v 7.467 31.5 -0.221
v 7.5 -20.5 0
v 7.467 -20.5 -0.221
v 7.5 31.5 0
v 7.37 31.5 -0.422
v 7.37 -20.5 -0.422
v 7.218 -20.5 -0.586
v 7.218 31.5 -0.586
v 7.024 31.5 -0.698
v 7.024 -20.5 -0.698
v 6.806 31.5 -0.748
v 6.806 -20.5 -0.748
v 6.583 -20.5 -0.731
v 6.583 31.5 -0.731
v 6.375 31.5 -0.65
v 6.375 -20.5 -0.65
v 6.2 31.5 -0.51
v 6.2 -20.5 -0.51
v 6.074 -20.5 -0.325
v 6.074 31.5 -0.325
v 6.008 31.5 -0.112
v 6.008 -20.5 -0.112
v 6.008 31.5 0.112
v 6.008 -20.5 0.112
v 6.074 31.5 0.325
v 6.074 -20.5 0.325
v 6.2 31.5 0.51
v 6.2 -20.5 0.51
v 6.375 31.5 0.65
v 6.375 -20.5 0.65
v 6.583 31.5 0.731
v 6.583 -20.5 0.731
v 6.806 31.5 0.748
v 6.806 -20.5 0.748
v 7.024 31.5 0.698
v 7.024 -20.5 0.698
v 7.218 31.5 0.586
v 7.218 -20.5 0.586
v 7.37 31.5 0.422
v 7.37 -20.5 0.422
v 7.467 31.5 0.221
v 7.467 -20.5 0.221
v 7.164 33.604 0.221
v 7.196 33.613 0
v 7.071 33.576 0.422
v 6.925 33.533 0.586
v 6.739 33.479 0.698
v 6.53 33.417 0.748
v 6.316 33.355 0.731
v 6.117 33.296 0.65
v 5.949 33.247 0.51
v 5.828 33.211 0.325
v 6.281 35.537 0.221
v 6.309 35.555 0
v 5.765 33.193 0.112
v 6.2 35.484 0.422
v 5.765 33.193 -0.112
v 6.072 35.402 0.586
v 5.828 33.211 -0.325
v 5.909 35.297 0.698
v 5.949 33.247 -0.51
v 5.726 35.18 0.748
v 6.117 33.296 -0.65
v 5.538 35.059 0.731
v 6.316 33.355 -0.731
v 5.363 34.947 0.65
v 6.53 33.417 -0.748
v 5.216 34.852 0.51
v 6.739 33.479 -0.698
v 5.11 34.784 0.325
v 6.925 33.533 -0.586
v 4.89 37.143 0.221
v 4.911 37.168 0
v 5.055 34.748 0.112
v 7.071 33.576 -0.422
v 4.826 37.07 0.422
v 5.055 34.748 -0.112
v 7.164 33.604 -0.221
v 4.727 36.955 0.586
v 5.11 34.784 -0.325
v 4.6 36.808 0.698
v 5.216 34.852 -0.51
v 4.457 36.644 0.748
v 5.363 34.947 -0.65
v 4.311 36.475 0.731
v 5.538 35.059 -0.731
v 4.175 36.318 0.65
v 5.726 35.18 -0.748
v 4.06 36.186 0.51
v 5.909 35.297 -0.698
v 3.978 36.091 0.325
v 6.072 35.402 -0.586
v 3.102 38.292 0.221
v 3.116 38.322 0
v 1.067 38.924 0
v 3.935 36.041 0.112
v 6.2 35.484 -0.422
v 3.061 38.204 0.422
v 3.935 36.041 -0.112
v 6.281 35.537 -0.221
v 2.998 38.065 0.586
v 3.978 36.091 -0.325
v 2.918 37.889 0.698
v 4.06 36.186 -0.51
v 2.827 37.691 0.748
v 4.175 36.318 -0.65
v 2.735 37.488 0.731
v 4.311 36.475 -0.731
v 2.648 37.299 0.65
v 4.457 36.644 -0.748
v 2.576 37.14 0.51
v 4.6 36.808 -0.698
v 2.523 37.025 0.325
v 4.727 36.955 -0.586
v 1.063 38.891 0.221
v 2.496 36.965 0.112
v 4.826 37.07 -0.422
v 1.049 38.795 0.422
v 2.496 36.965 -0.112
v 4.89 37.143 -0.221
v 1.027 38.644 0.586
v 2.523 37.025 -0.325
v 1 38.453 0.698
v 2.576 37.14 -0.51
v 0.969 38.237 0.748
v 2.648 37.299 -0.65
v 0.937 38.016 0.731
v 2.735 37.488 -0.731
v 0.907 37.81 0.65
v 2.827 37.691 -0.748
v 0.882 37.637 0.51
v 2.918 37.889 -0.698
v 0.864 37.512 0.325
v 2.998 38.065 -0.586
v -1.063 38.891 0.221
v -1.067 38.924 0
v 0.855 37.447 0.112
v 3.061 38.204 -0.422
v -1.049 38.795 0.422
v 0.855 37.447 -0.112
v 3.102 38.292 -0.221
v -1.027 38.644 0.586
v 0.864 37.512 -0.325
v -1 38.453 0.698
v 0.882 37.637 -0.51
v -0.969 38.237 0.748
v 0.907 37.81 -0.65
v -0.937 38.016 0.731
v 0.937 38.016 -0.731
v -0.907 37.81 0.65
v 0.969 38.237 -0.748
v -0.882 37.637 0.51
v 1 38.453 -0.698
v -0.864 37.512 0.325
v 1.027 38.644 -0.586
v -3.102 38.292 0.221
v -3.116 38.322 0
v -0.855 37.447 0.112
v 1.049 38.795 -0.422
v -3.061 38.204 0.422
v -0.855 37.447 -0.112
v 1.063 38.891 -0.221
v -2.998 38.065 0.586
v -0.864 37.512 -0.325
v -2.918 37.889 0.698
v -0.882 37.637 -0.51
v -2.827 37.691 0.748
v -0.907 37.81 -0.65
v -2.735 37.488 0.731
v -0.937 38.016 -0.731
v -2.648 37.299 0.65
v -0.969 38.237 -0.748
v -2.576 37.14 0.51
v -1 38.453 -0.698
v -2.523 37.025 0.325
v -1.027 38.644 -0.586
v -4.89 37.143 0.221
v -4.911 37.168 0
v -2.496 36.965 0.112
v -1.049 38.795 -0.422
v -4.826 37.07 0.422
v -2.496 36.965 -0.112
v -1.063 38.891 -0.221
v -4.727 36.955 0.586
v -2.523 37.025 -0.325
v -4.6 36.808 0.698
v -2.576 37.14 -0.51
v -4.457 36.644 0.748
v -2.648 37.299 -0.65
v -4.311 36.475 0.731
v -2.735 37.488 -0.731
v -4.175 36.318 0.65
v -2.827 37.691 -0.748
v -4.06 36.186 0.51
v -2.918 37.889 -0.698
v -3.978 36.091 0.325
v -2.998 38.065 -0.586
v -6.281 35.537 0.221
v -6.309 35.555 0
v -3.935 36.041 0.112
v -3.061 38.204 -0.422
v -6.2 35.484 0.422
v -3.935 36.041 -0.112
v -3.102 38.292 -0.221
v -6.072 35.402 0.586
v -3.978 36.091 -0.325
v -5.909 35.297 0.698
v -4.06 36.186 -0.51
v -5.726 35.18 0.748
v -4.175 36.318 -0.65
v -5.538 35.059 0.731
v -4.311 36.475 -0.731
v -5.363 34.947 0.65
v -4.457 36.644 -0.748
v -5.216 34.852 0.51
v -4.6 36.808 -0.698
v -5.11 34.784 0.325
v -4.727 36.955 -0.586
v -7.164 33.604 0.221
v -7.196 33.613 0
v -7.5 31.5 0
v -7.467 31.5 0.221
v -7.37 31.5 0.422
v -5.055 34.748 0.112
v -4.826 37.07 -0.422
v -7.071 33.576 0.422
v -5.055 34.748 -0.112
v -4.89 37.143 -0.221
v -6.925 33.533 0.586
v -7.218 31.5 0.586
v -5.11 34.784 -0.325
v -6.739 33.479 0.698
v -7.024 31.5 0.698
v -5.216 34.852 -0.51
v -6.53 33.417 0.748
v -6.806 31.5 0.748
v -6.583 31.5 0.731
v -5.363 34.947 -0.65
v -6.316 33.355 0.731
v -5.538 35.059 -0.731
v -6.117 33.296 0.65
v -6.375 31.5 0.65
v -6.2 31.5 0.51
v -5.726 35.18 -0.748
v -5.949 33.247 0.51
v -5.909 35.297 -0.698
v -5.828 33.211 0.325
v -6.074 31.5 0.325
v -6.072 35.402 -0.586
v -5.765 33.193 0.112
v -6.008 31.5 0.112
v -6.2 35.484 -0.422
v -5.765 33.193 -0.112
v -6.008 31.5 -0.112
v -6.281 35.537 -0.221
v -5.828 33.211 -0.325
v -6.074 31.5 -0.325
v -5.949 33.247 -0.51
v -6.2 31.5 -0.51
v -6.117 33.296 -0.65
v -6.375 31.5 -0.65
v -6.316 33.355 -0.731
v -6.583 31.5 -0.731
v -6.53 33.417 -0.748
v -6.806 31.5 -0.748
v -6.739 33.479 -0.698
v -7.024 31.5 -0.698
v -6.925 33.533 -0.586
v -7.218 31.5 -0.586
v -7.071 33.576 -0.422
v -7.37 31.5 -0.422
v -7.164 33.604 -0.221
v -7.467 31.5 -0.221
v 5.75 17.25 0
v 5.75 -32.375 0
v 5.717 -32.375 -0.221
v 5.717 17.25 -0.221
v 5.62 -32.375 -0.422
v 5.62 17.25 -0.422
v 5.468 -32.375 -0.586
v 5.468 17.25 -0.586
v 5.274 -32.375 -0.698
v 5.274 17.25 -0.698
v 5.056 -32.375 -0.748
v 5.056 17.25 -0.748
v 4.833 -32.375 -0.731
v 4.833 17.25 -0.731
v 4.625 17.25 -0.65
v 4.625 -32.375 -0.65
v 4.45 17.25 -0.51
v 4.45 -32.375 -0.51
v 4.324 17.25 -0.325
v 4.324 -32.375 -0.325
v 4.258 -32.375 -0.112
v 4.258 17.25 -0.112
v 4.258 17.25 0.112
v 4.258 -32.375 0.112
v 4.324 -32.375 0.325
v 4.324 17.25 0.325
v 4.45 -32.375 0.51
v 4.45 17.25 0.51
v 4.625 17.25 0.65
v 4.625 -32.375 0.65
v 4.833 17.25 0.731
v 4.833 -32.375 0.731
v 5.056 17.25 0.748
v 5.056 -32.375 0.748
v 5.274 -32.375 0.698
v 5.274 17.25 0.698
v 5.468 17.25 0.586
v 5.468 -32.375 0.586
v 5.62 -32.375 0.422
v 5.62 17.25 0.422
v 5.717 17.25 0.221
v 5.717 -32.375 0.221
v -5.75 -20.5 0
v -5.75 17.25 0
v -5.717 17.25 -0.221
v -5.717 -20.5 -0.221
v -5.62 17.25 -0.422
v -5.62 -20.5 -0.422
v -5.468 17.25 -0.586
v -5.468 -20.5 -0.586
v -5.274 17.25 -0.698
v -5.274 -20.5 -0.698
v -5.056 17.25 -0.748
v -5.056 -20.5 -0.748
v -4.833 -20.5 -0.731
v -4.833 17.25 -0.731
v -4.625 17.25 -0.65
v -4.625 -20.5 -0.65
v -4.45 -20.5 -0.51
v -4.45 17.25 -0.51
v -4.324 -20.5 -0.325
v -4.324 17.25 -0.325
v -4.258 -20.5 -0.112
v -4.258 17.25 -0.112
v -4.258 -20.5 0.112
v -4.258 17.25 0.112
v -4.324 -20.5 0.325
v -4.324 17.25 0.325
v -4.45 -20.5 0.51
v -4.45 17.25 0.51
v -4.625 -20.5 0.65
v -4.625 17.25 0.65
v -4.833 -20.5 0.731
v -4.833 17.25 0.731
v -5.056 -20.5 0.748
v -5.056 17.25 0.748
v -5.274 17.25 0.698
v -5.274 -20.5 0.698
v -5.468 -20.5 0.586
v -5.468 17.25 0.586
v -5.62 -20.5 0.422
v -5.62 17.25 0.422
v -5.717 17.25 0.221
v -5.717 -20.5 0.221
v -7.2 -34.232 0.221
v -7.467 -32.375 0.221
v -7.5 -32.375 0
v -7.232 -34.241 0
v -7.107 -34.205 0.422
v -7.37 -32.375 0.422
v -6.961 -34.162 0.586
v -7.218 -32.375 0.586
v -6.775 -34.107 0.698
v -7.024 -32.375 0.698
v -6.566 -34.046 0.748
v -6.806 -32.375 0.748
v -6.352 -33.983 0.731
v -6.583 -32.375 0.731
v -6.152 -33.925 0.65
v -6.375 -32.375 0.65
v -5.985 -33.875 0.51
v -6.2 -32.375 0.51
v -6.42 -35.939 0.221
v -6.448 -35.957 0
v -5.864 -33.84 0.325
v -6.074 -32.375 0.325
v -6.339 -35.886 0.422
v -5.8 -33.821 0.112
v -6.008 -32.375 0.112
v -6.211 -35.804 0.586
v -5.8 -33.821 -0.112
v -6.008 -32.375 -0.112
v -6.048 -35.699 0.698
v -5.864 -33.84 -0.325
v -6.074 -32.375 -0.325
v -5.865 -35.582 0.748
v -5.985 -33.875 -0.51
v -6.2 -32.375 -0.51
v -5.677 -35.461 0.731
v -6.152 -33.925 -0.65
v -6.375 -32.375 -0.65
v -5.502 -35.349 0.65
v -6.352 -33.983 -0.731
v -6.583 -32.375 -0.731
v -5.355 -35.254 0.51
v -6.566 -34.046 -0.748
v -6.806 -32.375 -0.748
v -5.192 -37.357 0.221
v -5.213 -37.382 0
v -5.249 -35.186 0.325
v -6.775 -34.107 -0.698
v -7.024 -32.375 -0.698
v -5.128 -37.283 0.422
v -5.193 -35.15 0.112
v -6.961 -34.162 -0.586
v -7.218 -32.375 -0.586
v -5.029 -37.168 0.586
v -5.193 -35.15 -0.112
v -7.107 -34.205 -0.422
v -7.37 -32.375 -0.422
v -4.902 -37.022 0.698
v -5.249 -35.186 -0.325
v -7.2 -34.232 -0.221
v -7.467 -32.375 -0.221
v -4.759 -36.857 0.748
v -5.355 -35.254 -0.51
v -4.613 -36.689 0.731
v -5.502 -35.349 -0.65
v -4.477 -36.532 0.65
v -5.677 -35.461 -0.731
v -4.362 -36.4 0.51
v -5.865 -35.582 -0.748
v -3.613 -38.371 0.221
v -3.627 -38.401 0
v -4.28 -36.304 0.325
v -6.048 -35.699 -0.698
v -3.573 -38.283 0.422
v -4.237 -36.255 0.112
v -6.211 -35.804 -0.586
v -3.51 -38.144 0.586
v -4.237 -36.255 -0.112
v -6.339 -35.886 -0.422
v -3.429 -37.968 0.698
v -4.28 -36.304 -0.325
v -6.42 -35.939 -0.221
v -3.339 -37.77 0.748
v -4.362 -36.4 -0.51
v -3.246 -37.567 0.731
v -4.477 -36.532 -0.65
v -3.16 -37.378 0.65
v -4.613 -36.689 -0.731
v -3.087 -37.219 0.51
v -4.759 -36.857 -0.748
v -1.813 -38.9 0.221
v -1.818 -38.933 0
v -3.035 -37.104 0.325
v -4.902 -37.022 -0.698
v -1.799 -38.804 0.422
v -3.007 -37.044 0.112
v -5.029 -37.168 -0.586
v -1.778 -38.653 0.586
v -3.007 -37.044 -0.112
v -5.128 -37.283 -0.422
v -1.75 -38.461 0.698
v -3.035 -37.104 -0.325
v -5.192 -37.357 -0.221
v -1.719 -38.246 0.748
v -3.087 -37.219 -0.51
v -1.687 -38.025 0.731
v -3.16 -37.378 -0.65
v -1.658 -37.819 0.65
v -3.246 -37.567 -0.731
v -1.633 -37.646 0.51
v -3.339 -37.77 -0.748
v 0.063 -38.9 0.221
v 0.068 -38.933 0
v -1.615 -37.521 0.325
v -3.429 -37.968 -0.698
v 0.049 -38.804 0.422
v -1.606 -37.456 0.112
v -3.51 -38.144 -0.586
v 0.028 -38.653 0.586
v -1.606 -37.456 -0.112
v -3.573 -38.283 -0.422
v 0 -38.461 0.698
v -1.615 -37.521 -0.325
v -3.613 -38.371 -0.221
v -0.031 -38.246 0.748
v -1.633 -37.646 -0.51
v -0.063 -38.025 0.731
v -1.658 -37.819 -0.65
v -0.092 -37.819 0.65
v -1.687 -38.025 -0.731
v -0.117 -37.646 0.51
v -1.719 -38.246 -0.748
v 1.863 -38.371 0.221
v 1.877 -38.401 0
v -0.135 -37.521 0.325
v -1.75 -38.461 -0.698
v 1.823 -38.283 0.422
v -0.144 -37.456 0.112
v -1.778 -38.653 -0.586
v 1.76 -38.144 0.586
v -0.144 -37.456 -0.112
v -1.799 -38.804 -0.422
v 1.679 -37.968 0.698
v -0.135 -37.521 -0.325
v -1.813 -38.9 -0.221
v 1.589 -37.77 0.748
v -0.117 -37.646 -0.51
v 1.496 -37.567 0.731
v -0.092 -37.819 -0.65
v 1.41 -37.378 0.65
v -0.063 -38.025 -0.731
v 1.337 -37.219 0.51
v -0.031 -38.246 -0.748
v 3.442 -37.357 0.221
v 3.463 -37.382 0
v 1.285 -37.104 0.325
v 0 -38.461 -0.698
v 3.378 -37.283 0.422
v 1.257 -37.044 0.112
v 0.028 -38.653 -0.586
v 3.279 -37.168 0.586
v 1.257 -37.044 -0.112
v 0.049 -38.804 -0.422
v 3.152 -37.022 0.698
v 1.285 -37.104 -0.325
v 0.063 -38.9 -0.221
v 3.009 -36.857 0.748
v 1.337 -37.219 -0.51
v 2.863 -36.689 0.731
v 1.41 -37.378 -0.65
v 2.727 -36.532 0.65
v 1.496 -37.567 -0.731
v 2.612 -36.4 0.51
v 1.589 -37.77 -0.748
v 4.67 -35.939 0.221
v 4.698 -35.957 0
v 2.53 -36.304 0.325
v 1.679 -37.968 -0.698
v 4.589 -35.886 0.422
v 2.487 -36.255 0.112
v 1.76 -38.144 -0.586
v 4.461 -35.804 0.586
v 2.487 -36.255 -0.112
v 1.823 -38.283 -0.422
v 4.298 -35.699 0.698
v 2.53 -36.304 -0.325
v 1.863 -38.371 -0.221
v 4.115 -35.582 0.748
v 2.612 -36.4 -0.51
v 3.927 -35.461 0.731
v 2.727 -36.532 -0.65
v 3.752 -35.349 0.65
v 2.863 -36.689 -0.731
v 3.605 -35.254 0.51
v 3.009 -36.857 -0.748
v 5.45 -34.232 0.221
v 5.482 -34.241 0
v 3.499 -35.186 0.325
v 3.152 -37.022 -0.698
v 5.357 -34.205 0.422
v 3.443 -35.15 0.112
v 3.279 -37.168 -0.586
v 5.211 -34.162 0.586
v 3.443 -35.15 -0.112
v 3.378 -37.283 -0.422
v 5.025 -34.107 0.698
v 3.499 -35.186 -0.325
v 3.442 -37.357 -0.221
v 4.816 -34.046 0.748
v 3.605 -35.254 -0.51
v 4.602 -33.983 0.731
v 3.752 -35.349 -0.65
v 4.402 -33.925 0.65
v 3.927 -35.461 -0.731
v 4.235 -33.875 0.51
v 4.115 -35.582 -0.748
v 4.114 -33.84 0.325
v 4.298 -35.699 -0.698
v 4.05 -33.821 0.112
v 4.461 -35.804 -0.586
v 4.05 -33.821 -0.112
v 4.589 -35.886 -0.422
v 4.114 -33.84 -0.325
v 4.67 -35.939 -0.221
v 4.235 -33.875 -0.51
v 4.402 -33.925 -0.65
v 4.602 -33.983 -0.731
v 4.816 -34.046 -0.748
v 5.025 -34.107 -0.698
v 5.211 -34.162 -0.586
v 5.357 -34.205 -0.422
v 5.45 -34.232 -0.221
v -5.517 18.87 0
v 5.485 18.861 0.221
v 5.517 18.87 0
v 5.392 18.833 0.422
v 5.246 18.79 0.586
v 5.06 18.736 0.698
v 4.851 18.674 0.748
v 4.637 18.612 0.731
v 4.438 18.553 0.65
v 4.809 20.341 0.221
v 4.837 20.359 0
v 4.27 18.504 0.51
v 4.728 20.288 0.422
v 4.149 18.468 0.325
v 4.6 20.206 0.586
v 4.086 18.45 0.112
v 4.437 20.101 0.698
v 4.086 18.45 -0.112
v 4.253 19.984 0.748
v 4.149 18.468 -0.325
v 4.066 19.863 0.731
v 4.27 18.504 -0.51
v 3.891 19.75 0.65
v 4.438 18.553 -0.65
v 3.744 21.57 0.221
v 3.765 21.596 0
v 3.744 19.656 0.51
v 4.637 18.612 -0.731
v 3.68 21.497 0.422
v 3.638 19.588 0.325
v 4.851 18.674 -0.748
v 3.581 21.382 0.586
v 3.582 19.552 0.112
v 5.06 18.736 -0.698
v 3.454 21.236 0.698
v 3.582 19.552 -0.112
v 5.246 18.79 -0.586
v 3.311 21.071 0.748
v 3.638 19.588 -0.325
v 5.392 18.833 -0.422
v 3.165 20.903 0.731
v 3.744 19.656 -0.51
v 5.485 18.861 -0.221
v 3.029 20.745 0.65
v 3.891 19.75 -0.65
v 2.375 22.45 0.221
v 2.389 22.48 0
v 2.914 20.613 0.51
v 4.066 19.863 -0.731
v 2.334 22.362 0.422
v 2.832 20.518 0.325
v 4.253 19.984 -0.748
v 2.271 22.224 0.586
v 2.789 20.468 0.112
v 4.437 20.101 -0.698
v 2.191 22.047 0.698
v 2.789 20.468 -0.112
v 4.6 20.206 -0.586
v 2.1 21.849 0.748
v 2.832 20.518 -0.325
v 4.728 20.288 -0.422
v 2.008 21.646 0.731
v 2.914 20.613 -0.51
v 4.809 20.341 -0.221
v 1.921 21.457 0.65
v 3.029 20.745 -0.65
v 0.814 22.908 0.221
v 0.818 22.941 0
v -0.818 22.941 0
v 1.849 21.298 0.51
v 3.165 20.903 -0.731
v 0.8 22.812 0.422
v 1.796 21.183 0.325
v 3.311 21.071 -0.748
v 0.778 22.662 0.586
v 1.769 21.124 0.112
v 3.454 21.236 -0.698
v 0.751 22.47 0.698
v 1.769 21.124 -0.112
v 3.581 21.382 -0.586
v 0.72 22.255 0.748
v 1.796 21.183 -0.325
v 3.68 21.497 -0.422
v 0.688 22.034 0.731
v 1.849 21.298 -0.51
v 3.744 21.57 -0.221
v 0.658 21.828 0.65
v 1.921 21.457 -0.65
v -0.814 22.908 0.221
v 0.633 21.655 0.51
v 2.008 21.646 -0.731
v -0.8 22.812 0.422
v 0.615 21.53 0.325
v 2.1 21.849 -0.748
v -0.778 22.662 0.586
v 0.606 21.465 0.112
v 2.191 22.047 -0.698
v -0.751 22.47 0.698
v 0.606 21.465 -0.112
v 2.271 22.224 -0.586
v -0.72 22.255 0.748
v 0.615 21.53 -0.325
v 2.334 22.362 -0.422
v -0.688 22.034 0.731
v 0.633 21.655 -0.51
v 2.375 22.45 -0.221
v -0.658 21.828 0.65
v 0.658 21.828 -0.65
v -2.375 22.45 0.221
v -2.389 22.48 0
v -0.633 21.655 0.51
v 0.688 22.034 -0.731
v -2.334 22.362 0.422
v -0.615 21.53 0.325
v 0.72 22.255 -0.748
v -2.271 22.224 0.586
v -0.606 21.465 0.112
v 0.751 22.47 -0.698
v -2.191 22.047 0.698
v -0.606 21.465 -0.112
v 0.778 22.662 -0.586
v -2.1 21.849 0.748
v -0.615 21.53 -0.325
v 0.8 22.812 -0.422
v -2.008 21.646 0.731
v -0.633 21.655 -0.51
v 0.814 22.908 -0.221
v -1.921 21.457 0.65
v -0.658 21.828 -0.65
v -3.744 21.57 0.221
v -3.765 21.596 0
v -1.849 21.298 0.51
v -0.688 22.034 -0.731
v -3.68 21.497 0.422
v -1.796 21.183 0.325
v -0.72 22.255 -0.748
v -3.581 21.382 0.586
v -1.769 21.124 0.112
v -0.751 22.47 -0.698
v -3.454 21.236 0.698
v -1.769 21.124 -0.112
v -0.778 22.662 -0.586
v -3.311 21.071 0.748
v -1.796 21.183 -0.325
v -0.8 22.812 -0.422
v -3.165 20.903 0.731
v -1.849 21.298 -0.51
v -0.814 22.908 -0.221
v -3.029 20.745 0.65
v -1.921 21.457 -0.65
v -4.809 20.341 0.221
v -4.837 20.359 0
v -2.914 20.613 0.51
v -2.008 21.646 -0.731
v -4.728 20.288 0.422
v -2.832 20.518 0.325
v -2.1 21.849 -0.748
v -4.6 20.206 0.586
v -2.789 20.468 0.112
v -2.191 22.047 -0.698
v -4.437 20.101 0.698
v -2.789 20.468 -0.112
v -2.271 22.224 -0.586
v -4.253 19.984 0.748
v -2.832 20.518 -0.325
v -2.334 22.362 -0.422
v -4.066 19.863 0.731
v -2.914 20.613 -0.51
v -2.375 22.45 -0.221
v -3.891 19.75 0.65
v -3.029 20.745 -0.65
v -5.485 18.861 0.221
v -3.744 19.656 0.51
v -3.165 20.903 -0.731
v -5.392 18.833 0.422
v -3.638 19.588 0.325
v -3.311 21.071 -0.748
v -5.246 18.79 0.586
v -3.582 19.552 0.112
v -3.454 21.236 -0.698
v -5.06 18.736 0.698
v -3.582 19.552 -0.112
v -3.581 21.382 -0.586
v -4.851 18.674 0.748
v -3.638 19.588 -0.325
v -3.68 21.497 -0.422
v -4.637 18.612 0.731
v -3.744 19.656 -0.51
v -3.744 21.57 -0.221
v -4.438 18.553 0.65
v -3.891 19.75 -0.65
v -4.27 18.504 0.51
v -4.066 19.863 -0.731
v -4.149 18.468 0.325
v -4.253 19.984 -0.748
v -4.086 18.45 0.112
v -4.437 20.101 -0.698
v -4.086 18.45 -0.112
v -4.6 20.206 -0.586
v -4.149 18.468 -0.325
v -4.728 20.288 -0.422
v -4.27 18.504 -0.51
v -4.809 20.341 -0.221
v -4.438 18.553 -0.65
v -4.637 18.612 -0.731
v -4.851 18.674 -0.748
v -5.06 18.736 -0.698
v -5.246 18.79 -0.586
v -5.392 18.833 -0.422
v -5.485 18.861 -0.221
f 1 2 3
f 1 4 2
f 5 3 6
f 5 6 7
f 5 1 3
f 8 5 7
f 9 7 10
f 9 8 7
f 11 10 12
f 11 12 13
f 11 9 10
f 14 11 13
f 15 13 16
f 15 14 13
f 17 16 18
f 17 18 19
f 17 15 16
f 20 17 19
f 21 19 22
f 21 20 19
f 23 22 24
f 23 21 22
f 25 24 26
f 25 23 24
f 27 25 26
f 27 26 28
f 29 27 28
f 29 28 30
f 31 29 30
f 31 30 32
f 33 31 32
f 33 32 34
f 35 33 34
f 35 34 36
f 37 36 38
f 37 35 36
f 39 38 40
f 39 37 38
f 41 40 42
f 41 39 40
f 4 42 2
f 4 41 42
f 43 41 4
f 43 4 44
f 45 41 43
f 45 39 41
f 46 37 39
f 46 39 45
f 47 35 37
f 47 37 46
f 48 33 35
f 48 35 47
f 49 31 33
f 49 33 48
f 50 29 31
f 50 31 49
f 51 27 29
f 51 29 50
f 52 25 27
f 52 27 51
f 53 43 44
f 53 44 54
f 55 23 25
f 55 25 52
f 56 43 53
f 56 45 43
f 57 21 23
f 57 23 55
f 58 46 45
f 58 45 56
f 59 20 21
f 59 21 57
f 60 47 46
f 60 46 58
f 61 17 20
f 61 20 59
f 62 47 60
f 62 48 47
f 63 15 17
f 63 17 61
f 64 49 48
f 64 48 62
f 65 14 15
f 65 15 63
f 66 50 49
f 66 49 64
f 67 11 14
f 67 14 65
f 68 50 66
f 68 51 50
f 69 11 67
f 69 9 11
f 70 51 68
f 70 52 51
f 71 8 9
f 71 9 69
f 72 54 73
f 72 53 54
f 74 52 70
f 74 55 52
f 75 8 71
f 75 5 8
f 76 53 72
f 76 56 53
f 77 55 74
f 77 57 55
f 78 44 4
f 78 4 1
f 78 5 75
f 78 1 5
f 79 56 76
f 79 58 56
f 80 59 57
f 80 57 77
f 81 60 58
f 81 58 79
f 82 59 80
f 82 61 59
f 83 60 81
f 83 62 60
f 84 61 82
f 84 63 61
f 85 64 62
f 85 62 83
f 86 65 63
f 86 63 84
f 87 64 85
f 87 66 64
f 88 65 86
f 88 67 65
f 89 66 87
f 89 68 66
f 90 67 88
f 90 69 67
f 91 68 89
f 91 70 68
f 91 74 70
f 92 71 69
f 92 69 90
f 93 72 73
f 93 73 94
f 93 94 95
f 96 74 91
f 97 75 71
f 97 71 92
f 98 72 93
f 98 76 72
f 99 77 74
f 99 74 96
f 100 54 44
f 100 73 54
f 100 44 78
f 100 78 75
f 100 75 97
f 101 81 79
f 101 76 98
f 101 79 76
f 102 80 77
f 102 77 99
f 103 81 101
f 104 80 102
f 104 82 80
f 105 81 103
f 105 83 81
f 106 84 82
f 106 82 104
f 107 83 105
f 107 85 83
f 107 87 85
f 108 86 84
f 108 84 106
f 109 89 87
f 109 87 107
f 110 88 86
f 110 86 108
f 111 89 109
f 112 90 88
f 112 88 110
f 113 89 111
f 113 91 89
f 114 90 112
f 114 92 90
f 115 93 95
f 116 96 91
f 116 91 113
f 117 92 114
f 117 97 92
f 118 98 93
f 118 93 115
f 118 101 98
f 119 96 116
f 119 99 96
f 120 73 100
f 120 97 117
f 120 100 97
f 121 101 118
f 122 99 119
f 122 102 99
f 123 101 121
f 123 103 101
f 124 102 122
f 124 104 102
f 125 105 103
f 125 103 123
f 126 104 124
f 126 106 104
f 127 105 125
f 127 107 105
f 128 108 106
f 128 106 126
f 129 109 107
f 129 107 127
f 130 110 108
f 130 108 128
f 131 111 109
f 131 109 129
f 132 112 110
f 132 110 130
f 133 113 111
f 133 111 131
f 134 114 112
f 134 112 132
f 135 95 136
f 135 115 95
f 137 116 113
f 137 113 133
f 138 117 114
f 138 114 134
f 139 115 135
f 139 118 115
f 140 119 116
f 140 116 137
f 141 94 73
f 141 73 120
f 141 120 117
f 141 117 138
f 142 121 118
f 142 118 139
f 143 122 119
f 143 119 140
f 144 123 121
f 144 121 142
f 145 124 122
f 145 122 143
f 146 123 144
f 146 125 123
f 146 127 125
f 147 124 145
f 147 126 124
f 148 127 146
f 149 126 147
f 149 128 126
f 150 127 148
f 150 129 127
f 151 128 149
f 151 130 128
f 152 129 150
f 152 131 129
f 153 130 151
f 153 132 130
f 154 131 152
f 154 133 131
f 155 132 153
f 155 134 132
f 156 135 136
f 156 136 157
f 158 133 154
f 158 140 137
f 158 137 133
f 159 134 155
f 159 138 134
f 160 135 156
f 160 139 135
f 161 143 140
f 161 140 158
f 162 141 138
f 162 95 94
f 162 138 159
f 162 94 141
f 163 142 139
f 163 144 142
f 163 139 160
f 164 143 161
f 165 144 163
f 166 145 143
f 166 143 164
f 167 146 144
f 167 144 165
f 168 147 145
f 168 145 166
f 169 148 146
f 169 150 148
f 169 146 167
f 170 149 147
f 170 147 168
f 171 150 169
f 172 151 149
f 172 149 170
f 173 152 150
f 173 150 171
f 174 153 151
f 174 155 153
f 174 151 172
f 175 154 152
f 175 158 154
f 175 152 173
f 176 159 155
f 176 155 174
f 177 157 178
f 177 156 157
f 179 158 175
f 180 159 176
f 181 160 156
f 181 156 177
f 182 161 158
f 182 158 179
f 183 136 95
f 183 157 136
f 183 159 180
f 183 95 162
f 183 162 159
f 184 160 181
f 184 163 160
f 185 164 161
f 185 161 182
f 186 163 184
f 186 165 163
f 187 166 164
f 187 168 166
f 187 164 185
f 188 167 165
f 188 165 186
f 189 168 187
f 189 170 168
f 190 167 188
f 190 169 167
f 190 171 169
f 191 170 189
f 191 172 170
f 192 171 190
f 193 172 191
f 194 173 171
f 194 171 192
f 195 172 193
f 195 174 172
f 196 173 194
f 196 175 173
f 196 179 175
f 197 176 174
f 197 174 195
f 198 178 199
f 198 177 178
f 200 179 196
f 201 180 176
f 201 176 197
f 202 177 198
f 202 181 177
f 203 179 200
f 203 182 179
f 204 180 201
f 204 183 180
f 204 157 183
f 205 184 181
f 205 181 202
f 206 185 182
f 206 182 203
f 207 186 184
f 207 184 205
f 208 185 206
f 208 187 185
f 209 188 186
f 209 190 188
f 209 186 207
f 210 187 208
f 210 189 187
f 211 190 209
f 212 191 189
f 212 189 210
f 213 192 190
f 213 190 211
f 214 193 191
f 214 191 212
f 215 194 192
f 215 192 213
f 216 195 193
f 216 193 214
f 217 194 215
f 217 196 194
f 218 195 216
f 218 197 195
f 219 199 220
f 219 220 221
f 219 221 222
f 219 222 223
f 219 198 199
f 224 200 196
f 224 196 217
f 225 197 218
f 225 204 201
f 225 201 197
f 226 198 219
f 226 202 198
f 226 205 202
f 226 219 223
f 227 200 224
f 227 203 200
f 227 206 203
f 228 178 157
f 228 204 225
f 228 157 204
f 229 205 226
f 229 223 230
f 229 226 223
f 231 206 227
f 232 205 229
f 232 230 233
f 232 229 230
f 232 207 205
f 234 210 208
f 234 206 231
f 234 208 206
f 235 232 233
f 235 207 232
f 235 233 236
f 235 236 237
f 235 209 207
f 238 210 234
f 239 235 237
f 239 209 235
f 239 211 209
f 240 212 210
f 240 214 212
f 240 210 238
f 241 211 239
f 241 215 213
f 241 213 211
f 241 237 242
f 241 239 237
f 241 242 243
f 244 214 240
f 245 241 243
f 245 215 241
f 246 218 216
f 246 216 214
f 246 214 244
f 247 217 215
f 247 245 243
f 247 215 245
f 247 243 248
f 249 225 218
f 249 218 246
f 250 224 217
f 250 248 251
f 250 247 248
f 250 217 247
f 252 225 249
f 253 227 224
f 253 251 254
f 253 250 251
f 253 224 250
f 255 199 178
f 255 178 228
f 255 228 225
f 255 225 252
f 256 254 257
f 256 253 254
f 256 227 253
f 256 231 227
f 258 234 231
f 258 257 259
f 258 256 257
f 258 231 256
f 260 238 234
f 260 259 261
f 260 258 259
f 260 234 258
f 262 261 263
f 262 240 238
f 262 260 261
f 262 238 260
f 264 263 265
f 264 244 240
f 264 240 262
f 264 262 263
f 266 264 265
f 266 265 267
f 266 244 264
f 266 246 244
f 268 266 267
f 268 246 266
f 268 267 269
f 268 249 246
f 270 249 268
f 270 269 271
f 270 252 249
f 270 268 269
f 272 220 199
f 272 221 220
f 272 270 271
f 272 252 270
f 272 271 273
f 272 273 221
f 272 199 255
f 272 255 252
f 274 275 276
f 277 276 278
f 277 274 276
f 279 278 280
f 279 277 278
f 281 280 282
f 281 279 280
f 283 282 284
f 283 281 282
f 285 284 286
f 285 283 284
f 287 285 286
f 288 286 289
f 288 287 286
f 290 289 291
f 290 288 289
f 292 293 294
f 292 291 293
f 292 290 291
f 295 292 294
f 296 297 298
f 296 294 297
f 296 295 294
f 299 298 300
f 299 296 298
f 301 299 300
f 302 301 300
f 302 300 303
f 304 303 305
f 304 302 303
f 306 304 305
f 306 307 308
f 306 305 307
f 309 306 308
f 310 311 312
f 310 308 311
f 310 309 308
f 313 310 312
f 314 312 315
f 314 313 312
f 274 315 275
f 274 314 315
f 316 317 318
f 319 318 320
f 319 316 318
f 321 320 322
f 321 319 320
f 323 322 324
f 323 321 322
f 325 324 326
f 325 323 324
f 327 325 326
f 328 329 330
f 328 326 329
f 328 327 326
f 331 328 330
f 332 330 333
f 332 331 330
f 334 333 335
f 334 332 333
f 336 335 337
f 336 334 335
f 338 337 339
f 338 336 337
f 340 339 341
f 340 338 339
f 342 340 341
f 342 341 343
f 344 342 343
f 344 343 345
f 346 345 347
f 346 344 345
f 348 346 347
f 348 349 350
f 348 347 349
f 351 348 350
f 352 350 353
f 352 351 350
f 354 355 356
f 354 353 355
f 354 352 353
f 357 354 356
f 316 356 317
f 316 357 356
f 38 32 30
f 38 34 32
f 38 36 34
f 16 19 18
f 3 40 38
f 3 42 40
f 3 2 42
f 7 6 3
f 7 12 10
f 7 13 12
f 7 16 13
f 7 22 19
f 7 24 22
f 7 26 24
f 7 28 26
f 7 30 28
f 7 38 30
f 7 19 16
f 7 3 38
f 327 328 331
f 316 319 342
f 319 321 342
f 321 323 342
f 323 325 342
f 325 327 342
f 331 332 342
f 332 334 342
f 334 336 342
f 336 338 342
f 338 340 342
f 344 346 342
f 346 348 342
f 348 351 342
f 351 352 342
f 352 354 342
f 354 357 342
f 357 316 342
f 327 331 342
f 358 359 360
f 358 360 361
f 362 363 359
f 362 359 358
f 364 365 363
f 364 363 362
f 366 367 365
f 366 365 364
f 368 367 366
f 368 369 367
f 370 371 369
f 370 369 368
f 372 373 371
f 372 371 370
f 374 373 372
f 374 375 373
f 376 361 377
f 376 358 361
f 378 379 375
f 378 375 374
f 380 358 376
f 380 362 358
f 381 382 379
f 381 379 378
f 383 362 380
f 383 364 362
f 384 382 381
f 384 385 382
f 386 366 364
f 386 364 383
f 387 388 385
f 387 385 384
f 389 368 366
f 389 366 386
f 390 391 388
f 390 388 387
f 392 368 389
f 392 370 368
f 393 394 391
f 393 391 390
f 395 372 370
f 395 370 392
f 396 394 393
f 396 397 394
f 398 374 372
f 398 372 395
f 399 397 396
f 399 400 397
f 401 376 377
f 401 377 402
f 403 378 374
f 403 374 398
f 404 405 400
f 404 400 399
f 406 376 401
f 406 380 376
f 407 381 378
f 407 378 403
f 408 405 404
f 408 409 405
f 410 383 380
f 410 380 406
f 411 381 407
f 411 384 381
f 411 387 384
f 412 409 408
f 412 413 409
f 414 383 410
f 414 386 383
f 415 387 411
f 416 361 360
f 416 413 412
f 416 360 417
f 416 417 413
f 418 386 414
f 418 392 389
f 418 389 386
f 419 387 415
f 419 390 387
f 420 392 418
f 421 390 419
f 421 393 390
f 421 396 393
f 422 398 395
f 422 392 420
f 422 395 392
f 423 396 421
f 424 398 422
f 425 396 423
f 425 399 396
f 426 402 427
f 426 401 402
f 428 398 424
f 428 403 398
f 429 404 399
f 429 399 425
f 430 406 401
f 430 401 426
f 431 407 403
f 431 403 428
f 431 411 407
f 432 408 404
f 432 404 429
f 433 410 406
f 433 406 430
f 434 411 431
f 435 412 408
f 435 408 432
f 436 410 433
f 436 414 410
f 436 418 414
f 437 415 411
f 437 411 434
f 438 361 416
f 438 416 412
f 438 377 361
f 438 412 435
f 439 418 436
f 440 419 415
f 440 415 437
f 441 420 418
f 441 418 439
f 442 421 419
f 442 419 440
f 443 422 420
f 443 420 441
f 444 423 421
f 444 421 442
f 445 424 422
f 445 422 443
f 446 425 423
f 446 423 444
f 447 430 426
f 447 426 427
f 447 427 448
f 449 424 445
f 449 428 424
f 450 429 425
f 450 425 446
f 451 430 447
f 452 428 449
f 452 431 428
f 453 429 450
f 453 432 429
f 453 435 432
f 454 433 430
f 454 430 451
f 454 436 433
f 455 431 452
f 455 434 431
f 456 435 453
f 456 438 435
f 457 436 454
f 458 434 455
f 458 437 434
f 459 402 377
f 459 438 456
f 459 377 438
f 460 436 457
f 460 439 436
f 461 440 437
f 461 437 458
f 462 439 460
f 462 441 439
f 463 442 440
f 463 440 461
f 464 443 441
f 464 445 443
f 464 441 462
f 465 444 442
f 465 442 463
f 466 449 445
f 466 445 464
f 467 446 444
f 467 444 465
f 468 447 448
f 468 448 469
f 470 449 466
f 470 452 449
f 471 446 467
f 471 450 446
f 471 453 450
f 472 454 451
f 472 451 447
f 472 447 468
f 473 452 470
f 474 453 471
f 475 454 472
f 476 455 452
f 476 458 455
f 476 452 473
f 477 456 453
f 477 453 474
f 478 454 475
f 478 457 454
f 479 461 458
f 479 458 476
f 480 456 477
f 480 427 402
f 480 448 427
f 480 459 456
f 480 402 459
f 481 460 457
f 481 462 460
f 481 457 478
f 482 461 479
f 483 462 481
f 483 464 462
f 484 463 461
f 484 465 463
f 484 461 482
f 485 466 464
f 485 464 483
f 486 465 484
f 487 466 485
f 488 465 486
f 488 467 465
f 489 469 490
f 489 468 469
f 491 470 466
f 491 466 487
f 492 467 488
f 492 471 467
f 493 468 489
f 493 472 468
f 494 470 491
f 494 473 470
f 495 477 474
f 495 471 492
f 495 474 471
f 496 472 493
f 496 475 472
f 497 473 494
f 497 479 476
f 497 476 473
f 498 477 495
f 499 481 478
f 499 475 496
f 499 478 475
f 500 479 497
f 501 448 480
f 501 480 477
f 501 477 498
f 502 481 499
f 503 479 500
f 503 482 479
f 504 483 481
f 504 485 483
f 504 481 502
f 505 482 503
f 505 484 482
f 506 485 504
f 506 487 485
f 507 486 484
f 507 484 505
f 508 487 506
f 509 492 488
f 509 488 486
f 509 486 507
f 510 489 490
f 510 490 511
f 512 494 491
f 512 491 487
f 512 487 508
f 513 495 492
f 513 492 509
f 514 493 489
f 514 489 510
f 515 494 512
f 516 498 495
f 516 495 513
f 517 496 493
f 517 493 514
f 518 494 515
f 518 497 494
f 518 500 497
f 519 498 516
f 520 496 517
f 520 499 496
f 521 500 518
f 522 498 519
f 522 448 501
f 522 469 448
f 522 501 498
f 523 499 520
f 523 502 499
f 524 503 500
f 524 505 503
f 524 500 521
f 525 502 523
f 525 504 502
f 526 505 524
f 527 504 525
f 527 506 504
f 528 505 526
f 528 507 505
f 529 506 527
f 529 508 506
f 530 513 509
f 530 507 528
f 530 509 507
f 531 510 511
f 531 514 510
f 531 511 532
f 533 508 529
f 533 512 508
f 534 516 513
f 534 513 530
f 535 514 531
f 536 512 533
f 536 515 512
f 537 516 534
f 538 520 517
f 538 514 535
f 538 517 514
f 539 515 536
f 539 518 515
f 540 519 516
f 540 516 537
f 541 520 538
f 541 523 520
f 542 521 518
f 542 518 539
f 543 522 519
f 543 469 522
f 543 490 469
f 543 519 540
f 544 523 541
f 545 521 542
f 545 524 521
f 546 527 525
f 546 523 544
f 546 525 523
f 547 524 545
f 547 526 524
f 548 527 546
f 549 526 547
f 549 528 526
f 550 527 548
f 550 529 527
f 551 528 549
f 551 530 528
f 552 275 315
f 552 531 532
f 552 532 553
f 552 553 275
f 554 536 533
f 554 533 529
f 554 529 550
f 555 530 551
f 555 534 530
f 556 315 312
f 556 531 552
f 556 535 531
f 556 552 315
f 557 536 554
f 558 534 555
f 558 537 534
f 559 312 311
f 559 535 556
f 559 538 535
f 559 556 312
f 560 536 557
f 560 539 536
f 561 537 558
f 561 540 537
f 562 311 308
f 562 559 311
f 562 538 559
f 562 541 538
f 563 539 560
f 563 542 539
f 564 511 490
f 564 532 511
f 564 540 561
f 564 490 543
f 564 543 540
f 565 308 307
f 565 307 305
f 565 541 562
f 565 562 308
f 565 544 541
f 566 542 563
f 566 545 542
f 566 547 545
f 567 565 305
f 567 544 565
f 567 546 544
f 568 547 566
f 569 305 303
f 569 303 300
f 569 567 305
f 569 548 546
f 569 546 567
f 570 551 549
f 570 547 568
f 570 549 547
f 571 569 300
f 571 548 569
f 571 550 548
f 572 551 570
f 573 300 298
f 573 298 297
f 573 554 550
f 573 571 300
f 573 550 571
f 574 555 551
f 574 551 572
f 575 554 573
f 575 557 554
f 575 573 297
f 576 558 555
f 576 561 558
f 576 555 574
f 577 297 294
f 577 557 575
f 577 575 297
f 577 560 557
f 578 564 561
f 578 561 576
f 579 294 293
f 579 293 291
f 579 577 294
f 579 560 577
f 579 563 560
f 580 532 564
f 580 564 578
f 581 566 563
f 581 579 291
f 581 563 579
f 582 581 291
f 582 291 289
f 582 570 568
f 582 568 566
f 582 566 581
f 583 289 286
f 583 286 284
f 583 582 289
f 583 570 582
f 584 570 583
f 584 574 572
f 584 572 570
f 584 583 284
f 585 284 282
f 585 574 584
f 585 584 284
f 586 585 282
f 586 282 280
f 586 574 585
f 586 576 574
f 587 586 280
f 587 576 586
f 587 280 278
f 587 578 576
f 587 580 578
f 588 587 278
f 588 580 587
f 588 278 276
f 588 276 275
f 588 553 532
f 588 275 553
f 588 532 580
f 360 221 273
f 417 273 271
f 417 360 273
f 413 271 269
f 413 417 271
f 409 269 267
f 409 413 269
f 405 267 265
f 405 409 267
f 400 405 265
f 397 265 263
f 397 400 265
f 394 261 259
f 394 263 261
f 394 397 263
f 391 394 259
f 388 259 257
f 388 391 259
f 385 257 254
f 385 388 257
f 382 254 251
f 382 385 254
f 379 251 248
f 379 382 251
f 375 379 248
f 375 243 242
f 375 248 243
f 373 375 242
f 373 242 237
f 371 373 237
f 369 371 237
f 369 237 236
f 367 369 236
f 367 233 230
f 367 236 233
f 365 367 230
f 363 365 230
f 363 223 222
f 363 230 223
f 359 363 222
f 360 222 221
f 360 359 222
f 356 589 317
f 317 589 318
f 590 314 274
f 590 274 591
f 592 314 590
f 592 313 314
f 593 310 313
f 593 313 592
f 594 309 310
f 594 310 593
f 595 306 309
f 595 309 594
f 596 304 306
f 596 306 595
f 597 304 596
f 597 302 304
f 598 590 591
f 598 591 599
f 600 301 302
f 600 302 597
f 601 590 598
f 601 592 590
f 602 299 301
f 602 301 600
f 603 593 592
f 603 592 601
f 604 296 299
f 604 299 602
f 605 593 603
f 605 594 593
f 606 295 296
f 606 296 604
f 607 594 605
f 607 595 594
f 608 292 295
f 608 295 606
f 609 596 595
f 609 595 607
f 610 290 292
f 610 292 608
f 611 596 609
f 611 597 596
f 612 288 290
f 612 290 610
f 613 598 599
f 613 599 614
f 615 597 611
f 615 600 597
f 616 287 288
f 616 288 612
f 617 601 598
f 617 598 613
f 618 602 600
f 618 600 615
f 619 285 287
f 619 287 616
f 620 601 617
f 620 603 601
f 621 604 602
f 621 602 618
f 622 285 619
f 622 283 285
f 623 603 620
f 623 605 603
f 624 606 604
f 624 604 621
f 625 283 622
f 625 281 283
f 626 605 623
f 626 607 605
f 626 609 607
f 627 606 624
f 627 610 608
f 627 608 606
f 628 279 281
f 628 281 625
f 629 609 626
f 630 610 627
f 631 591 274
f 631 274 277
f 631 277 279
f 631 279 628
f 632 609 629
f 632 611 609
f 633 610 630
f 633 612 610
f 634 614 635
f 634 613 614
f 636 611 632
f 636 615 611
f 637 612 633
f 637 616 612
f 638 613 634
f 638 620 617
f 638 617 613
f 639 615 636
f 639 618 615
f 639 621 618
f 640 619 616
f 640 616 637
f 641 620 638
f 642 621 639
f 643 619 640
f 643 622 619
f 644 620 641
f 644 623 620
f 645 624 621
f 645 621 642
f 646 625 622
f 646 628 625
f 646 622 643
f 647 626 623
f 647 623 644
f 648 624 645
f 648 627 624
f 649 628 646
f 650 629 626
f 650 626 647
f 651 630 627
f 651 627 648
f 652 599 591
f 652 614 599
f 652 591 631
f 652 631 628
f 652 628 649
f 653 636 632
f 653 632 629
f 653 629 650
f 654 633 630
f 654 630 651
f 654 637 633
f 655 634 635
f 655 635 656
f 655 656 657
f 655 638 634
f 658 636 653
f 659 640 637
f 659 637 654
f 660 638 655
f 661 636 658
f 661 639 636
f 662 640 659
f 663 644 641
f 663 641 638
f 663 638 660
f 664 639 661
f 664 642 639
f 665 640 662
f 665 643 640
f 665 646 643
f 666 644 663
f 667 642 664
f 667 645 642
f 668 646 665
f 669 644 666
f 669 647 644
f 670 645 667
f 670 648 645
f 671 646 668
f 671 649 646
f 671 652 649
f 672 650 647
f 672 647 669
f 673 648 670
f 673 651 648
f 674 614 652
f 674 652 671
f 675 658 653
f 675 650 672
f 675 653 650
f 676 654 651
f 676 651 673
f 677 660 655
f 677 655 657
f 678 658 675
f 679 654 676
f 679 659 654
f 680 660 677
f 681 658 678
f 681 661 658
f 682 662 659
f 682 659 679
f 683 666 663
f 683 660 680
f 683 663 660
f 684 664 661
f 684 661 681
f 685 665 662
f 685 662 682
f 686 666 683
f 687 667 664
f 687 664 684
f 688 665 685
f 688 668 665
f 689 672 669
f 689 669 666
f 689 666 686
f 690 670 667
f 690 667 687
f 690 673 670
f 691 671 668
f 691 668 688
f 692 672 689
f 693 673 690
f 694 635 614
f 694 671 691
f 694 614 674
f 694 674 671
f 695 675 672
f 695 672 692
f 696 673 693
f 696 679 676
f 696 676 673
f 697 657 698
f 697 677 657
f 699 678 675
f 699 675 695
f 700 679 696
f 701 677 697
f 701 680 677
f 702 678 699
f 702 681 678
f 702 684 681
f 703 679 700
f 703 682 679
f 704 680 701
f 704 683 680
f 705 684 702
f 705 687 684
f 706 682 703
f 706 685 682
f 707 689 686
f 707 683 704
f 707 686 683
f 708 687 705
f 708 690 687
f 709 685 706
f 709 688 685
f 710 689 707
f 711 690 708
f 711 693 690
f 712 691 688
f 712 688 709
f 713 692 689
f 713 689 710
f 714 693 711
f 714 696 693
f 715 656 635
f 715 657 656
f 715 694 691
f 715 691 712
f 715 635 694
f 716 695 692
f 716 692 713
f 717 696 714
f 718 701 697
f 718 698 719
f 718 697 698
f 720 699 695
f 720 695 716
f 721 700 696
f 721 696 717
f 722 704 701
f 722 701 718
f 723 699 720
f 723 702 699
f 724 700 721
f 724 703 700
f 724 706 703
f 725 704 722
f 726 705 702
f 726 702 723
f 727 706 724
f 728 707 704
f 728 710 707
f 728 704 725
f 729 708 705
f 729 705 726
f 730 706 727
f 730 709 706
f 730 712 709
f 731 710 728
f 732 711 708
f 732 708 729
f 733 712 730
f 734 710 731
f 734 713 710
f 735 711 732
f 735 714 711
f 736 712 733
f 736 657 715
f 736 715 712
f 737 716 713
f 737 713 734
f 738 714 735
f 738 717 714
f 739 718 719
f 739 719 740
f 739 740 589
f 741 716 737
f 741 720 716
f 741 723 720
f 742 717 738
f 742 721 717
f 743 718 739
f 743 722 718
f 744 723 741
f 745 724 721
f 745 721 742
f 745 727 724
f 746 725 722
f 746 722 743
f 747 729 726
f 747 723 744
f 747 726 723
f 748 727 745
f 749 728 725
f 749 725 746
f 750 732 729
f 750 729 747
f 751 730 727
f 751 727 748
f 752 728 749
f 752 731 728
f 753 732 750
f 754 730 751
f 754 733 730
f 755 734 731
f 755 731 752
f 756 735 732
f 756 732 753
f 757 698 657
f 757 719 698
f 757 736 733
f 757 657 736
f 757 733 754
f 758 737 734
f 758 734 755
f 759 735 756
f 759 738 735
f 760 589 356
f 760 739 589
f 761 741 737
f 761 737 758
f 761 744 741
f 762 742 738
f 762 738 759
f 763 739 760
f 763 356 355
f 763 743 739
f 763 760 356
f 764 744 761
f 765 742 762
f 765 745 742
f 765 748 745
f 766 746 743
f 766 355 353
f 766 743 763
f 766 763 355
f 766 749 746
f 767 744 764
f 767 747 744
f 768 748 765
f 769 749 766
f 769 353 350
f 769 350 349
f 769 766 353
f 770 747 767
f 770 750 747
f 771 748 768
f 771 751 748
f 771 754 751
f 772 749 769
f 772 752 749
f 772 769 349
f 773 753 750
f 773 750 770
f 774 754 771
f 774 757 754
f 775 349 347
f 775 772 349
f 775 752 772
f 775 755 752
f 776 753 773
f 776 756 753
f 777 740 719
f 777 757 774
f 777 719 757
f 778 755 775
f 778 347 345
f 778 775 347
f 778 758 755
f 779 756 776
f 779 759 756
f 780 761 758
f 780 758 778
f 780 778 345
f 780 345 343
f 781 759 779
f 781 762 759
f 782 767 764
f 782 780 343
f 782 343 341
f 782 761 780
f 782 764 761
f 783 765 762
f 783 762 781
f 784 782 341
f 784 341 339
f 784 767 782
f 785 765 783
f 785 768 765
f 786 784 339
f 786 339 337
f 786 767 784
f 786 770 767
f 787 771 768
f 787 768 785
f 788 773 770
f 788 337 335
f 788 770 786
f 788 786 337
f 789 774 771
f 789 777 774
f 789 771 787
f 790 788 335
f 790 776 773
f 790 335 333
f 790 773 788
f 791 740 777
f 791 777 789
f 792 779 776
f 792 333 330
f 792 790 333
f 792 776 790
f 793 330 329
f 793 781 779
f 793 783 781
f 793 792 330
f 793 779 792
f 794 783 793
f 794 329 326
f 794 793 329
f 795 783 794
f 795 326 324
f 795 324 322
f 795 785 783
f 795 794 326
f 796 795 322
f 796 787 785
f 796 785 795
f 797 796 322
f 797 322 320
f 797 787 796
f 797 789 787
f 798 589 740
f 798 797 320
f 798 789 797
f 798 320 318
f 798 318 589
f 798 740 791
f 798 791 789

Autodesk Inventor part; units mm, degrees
ref_plane "YZ Plane" through (0, 0, 0) normal (1, 0, 0) x (0, 1, 0)
ref_plane "XY Plane" through (0, 0, 0) normal (0, 0, 1) x (1, 0, 0)
sketch "Sketch1" plane through (0, 0, 0) normal (0, 0, 1) x (1, 0, 0)
  line L0 (-6.75, -38.25) -> (6.75, -38.25) construction
  line L1 (6.75, -38.25) -> (6.75, 38.25) construction
  line L2 (6.75, 38.25) -> (-6.75, 38.25) construction
  line L3 (-6.75, 38.25) -> (-6.75, -38.25) construction
  line L4 (-6.75, -38.25) -> (6.75, 38.25) construction
  line L5 (6.75, -38.25) -> (-6.75, 38.25) construction
  arc A0 (6.75, 31.5) -> (-6.75, 31.5) centre (0, 31.5) ccw
  line L6 (-6.75, 22.25) -> (6.75, 22.25) construction
  arc A1 (-6.75, -32.375) -> (5, -32.375) centre (-0.875, -32.375) ccw
  line L7 (-6.75, 31.5) -> (-6.75, -32.375)
  line L8 (6.75, 31.5) -> (6.75, -20.5)
  line L9 (5, -32.375) -> (5, 17.25)
  arc A2 (5, 17.25) -> (-5, 17.25) centre (0, 17.25) ccw
  line L10 (6.75, -20.5) -> (-6.75, -20.5) construction
  line L11 (-5, 17.25) -> (-5, -20.5)
  line L12 (0, 31.5) -> (0, -46.328) construction
  point P0 (0, 0)
  dimension "d0" = 76.5
  dimension "d1" = 13.5
  dimension "d3" = 60.5
  dimension "d5" = 52
  dimension "d11" = 1.75
  dimension "d13" = 1.75
  dimension "d14" = 1.75
ref_plane "Work Plane1" through (-5, -20.5, 0) normal (0, 1, 0) x (-1, 0, 0)
sketch "Sketch2" plane through (-5, -20.5, 0) normal (0, 1, 0) x (-1, 0, 0)
  circle A0 centre (0, 0) radius 0.75
  point P0 (-5, 0)
  dimension "d7" = 1.5
sweep "Sweep1" add profiles "Sketch2" path "Sketch1"
equation "\"d14\" = d13"
properties part number "paperclip_big" material "Stainless Steel"
